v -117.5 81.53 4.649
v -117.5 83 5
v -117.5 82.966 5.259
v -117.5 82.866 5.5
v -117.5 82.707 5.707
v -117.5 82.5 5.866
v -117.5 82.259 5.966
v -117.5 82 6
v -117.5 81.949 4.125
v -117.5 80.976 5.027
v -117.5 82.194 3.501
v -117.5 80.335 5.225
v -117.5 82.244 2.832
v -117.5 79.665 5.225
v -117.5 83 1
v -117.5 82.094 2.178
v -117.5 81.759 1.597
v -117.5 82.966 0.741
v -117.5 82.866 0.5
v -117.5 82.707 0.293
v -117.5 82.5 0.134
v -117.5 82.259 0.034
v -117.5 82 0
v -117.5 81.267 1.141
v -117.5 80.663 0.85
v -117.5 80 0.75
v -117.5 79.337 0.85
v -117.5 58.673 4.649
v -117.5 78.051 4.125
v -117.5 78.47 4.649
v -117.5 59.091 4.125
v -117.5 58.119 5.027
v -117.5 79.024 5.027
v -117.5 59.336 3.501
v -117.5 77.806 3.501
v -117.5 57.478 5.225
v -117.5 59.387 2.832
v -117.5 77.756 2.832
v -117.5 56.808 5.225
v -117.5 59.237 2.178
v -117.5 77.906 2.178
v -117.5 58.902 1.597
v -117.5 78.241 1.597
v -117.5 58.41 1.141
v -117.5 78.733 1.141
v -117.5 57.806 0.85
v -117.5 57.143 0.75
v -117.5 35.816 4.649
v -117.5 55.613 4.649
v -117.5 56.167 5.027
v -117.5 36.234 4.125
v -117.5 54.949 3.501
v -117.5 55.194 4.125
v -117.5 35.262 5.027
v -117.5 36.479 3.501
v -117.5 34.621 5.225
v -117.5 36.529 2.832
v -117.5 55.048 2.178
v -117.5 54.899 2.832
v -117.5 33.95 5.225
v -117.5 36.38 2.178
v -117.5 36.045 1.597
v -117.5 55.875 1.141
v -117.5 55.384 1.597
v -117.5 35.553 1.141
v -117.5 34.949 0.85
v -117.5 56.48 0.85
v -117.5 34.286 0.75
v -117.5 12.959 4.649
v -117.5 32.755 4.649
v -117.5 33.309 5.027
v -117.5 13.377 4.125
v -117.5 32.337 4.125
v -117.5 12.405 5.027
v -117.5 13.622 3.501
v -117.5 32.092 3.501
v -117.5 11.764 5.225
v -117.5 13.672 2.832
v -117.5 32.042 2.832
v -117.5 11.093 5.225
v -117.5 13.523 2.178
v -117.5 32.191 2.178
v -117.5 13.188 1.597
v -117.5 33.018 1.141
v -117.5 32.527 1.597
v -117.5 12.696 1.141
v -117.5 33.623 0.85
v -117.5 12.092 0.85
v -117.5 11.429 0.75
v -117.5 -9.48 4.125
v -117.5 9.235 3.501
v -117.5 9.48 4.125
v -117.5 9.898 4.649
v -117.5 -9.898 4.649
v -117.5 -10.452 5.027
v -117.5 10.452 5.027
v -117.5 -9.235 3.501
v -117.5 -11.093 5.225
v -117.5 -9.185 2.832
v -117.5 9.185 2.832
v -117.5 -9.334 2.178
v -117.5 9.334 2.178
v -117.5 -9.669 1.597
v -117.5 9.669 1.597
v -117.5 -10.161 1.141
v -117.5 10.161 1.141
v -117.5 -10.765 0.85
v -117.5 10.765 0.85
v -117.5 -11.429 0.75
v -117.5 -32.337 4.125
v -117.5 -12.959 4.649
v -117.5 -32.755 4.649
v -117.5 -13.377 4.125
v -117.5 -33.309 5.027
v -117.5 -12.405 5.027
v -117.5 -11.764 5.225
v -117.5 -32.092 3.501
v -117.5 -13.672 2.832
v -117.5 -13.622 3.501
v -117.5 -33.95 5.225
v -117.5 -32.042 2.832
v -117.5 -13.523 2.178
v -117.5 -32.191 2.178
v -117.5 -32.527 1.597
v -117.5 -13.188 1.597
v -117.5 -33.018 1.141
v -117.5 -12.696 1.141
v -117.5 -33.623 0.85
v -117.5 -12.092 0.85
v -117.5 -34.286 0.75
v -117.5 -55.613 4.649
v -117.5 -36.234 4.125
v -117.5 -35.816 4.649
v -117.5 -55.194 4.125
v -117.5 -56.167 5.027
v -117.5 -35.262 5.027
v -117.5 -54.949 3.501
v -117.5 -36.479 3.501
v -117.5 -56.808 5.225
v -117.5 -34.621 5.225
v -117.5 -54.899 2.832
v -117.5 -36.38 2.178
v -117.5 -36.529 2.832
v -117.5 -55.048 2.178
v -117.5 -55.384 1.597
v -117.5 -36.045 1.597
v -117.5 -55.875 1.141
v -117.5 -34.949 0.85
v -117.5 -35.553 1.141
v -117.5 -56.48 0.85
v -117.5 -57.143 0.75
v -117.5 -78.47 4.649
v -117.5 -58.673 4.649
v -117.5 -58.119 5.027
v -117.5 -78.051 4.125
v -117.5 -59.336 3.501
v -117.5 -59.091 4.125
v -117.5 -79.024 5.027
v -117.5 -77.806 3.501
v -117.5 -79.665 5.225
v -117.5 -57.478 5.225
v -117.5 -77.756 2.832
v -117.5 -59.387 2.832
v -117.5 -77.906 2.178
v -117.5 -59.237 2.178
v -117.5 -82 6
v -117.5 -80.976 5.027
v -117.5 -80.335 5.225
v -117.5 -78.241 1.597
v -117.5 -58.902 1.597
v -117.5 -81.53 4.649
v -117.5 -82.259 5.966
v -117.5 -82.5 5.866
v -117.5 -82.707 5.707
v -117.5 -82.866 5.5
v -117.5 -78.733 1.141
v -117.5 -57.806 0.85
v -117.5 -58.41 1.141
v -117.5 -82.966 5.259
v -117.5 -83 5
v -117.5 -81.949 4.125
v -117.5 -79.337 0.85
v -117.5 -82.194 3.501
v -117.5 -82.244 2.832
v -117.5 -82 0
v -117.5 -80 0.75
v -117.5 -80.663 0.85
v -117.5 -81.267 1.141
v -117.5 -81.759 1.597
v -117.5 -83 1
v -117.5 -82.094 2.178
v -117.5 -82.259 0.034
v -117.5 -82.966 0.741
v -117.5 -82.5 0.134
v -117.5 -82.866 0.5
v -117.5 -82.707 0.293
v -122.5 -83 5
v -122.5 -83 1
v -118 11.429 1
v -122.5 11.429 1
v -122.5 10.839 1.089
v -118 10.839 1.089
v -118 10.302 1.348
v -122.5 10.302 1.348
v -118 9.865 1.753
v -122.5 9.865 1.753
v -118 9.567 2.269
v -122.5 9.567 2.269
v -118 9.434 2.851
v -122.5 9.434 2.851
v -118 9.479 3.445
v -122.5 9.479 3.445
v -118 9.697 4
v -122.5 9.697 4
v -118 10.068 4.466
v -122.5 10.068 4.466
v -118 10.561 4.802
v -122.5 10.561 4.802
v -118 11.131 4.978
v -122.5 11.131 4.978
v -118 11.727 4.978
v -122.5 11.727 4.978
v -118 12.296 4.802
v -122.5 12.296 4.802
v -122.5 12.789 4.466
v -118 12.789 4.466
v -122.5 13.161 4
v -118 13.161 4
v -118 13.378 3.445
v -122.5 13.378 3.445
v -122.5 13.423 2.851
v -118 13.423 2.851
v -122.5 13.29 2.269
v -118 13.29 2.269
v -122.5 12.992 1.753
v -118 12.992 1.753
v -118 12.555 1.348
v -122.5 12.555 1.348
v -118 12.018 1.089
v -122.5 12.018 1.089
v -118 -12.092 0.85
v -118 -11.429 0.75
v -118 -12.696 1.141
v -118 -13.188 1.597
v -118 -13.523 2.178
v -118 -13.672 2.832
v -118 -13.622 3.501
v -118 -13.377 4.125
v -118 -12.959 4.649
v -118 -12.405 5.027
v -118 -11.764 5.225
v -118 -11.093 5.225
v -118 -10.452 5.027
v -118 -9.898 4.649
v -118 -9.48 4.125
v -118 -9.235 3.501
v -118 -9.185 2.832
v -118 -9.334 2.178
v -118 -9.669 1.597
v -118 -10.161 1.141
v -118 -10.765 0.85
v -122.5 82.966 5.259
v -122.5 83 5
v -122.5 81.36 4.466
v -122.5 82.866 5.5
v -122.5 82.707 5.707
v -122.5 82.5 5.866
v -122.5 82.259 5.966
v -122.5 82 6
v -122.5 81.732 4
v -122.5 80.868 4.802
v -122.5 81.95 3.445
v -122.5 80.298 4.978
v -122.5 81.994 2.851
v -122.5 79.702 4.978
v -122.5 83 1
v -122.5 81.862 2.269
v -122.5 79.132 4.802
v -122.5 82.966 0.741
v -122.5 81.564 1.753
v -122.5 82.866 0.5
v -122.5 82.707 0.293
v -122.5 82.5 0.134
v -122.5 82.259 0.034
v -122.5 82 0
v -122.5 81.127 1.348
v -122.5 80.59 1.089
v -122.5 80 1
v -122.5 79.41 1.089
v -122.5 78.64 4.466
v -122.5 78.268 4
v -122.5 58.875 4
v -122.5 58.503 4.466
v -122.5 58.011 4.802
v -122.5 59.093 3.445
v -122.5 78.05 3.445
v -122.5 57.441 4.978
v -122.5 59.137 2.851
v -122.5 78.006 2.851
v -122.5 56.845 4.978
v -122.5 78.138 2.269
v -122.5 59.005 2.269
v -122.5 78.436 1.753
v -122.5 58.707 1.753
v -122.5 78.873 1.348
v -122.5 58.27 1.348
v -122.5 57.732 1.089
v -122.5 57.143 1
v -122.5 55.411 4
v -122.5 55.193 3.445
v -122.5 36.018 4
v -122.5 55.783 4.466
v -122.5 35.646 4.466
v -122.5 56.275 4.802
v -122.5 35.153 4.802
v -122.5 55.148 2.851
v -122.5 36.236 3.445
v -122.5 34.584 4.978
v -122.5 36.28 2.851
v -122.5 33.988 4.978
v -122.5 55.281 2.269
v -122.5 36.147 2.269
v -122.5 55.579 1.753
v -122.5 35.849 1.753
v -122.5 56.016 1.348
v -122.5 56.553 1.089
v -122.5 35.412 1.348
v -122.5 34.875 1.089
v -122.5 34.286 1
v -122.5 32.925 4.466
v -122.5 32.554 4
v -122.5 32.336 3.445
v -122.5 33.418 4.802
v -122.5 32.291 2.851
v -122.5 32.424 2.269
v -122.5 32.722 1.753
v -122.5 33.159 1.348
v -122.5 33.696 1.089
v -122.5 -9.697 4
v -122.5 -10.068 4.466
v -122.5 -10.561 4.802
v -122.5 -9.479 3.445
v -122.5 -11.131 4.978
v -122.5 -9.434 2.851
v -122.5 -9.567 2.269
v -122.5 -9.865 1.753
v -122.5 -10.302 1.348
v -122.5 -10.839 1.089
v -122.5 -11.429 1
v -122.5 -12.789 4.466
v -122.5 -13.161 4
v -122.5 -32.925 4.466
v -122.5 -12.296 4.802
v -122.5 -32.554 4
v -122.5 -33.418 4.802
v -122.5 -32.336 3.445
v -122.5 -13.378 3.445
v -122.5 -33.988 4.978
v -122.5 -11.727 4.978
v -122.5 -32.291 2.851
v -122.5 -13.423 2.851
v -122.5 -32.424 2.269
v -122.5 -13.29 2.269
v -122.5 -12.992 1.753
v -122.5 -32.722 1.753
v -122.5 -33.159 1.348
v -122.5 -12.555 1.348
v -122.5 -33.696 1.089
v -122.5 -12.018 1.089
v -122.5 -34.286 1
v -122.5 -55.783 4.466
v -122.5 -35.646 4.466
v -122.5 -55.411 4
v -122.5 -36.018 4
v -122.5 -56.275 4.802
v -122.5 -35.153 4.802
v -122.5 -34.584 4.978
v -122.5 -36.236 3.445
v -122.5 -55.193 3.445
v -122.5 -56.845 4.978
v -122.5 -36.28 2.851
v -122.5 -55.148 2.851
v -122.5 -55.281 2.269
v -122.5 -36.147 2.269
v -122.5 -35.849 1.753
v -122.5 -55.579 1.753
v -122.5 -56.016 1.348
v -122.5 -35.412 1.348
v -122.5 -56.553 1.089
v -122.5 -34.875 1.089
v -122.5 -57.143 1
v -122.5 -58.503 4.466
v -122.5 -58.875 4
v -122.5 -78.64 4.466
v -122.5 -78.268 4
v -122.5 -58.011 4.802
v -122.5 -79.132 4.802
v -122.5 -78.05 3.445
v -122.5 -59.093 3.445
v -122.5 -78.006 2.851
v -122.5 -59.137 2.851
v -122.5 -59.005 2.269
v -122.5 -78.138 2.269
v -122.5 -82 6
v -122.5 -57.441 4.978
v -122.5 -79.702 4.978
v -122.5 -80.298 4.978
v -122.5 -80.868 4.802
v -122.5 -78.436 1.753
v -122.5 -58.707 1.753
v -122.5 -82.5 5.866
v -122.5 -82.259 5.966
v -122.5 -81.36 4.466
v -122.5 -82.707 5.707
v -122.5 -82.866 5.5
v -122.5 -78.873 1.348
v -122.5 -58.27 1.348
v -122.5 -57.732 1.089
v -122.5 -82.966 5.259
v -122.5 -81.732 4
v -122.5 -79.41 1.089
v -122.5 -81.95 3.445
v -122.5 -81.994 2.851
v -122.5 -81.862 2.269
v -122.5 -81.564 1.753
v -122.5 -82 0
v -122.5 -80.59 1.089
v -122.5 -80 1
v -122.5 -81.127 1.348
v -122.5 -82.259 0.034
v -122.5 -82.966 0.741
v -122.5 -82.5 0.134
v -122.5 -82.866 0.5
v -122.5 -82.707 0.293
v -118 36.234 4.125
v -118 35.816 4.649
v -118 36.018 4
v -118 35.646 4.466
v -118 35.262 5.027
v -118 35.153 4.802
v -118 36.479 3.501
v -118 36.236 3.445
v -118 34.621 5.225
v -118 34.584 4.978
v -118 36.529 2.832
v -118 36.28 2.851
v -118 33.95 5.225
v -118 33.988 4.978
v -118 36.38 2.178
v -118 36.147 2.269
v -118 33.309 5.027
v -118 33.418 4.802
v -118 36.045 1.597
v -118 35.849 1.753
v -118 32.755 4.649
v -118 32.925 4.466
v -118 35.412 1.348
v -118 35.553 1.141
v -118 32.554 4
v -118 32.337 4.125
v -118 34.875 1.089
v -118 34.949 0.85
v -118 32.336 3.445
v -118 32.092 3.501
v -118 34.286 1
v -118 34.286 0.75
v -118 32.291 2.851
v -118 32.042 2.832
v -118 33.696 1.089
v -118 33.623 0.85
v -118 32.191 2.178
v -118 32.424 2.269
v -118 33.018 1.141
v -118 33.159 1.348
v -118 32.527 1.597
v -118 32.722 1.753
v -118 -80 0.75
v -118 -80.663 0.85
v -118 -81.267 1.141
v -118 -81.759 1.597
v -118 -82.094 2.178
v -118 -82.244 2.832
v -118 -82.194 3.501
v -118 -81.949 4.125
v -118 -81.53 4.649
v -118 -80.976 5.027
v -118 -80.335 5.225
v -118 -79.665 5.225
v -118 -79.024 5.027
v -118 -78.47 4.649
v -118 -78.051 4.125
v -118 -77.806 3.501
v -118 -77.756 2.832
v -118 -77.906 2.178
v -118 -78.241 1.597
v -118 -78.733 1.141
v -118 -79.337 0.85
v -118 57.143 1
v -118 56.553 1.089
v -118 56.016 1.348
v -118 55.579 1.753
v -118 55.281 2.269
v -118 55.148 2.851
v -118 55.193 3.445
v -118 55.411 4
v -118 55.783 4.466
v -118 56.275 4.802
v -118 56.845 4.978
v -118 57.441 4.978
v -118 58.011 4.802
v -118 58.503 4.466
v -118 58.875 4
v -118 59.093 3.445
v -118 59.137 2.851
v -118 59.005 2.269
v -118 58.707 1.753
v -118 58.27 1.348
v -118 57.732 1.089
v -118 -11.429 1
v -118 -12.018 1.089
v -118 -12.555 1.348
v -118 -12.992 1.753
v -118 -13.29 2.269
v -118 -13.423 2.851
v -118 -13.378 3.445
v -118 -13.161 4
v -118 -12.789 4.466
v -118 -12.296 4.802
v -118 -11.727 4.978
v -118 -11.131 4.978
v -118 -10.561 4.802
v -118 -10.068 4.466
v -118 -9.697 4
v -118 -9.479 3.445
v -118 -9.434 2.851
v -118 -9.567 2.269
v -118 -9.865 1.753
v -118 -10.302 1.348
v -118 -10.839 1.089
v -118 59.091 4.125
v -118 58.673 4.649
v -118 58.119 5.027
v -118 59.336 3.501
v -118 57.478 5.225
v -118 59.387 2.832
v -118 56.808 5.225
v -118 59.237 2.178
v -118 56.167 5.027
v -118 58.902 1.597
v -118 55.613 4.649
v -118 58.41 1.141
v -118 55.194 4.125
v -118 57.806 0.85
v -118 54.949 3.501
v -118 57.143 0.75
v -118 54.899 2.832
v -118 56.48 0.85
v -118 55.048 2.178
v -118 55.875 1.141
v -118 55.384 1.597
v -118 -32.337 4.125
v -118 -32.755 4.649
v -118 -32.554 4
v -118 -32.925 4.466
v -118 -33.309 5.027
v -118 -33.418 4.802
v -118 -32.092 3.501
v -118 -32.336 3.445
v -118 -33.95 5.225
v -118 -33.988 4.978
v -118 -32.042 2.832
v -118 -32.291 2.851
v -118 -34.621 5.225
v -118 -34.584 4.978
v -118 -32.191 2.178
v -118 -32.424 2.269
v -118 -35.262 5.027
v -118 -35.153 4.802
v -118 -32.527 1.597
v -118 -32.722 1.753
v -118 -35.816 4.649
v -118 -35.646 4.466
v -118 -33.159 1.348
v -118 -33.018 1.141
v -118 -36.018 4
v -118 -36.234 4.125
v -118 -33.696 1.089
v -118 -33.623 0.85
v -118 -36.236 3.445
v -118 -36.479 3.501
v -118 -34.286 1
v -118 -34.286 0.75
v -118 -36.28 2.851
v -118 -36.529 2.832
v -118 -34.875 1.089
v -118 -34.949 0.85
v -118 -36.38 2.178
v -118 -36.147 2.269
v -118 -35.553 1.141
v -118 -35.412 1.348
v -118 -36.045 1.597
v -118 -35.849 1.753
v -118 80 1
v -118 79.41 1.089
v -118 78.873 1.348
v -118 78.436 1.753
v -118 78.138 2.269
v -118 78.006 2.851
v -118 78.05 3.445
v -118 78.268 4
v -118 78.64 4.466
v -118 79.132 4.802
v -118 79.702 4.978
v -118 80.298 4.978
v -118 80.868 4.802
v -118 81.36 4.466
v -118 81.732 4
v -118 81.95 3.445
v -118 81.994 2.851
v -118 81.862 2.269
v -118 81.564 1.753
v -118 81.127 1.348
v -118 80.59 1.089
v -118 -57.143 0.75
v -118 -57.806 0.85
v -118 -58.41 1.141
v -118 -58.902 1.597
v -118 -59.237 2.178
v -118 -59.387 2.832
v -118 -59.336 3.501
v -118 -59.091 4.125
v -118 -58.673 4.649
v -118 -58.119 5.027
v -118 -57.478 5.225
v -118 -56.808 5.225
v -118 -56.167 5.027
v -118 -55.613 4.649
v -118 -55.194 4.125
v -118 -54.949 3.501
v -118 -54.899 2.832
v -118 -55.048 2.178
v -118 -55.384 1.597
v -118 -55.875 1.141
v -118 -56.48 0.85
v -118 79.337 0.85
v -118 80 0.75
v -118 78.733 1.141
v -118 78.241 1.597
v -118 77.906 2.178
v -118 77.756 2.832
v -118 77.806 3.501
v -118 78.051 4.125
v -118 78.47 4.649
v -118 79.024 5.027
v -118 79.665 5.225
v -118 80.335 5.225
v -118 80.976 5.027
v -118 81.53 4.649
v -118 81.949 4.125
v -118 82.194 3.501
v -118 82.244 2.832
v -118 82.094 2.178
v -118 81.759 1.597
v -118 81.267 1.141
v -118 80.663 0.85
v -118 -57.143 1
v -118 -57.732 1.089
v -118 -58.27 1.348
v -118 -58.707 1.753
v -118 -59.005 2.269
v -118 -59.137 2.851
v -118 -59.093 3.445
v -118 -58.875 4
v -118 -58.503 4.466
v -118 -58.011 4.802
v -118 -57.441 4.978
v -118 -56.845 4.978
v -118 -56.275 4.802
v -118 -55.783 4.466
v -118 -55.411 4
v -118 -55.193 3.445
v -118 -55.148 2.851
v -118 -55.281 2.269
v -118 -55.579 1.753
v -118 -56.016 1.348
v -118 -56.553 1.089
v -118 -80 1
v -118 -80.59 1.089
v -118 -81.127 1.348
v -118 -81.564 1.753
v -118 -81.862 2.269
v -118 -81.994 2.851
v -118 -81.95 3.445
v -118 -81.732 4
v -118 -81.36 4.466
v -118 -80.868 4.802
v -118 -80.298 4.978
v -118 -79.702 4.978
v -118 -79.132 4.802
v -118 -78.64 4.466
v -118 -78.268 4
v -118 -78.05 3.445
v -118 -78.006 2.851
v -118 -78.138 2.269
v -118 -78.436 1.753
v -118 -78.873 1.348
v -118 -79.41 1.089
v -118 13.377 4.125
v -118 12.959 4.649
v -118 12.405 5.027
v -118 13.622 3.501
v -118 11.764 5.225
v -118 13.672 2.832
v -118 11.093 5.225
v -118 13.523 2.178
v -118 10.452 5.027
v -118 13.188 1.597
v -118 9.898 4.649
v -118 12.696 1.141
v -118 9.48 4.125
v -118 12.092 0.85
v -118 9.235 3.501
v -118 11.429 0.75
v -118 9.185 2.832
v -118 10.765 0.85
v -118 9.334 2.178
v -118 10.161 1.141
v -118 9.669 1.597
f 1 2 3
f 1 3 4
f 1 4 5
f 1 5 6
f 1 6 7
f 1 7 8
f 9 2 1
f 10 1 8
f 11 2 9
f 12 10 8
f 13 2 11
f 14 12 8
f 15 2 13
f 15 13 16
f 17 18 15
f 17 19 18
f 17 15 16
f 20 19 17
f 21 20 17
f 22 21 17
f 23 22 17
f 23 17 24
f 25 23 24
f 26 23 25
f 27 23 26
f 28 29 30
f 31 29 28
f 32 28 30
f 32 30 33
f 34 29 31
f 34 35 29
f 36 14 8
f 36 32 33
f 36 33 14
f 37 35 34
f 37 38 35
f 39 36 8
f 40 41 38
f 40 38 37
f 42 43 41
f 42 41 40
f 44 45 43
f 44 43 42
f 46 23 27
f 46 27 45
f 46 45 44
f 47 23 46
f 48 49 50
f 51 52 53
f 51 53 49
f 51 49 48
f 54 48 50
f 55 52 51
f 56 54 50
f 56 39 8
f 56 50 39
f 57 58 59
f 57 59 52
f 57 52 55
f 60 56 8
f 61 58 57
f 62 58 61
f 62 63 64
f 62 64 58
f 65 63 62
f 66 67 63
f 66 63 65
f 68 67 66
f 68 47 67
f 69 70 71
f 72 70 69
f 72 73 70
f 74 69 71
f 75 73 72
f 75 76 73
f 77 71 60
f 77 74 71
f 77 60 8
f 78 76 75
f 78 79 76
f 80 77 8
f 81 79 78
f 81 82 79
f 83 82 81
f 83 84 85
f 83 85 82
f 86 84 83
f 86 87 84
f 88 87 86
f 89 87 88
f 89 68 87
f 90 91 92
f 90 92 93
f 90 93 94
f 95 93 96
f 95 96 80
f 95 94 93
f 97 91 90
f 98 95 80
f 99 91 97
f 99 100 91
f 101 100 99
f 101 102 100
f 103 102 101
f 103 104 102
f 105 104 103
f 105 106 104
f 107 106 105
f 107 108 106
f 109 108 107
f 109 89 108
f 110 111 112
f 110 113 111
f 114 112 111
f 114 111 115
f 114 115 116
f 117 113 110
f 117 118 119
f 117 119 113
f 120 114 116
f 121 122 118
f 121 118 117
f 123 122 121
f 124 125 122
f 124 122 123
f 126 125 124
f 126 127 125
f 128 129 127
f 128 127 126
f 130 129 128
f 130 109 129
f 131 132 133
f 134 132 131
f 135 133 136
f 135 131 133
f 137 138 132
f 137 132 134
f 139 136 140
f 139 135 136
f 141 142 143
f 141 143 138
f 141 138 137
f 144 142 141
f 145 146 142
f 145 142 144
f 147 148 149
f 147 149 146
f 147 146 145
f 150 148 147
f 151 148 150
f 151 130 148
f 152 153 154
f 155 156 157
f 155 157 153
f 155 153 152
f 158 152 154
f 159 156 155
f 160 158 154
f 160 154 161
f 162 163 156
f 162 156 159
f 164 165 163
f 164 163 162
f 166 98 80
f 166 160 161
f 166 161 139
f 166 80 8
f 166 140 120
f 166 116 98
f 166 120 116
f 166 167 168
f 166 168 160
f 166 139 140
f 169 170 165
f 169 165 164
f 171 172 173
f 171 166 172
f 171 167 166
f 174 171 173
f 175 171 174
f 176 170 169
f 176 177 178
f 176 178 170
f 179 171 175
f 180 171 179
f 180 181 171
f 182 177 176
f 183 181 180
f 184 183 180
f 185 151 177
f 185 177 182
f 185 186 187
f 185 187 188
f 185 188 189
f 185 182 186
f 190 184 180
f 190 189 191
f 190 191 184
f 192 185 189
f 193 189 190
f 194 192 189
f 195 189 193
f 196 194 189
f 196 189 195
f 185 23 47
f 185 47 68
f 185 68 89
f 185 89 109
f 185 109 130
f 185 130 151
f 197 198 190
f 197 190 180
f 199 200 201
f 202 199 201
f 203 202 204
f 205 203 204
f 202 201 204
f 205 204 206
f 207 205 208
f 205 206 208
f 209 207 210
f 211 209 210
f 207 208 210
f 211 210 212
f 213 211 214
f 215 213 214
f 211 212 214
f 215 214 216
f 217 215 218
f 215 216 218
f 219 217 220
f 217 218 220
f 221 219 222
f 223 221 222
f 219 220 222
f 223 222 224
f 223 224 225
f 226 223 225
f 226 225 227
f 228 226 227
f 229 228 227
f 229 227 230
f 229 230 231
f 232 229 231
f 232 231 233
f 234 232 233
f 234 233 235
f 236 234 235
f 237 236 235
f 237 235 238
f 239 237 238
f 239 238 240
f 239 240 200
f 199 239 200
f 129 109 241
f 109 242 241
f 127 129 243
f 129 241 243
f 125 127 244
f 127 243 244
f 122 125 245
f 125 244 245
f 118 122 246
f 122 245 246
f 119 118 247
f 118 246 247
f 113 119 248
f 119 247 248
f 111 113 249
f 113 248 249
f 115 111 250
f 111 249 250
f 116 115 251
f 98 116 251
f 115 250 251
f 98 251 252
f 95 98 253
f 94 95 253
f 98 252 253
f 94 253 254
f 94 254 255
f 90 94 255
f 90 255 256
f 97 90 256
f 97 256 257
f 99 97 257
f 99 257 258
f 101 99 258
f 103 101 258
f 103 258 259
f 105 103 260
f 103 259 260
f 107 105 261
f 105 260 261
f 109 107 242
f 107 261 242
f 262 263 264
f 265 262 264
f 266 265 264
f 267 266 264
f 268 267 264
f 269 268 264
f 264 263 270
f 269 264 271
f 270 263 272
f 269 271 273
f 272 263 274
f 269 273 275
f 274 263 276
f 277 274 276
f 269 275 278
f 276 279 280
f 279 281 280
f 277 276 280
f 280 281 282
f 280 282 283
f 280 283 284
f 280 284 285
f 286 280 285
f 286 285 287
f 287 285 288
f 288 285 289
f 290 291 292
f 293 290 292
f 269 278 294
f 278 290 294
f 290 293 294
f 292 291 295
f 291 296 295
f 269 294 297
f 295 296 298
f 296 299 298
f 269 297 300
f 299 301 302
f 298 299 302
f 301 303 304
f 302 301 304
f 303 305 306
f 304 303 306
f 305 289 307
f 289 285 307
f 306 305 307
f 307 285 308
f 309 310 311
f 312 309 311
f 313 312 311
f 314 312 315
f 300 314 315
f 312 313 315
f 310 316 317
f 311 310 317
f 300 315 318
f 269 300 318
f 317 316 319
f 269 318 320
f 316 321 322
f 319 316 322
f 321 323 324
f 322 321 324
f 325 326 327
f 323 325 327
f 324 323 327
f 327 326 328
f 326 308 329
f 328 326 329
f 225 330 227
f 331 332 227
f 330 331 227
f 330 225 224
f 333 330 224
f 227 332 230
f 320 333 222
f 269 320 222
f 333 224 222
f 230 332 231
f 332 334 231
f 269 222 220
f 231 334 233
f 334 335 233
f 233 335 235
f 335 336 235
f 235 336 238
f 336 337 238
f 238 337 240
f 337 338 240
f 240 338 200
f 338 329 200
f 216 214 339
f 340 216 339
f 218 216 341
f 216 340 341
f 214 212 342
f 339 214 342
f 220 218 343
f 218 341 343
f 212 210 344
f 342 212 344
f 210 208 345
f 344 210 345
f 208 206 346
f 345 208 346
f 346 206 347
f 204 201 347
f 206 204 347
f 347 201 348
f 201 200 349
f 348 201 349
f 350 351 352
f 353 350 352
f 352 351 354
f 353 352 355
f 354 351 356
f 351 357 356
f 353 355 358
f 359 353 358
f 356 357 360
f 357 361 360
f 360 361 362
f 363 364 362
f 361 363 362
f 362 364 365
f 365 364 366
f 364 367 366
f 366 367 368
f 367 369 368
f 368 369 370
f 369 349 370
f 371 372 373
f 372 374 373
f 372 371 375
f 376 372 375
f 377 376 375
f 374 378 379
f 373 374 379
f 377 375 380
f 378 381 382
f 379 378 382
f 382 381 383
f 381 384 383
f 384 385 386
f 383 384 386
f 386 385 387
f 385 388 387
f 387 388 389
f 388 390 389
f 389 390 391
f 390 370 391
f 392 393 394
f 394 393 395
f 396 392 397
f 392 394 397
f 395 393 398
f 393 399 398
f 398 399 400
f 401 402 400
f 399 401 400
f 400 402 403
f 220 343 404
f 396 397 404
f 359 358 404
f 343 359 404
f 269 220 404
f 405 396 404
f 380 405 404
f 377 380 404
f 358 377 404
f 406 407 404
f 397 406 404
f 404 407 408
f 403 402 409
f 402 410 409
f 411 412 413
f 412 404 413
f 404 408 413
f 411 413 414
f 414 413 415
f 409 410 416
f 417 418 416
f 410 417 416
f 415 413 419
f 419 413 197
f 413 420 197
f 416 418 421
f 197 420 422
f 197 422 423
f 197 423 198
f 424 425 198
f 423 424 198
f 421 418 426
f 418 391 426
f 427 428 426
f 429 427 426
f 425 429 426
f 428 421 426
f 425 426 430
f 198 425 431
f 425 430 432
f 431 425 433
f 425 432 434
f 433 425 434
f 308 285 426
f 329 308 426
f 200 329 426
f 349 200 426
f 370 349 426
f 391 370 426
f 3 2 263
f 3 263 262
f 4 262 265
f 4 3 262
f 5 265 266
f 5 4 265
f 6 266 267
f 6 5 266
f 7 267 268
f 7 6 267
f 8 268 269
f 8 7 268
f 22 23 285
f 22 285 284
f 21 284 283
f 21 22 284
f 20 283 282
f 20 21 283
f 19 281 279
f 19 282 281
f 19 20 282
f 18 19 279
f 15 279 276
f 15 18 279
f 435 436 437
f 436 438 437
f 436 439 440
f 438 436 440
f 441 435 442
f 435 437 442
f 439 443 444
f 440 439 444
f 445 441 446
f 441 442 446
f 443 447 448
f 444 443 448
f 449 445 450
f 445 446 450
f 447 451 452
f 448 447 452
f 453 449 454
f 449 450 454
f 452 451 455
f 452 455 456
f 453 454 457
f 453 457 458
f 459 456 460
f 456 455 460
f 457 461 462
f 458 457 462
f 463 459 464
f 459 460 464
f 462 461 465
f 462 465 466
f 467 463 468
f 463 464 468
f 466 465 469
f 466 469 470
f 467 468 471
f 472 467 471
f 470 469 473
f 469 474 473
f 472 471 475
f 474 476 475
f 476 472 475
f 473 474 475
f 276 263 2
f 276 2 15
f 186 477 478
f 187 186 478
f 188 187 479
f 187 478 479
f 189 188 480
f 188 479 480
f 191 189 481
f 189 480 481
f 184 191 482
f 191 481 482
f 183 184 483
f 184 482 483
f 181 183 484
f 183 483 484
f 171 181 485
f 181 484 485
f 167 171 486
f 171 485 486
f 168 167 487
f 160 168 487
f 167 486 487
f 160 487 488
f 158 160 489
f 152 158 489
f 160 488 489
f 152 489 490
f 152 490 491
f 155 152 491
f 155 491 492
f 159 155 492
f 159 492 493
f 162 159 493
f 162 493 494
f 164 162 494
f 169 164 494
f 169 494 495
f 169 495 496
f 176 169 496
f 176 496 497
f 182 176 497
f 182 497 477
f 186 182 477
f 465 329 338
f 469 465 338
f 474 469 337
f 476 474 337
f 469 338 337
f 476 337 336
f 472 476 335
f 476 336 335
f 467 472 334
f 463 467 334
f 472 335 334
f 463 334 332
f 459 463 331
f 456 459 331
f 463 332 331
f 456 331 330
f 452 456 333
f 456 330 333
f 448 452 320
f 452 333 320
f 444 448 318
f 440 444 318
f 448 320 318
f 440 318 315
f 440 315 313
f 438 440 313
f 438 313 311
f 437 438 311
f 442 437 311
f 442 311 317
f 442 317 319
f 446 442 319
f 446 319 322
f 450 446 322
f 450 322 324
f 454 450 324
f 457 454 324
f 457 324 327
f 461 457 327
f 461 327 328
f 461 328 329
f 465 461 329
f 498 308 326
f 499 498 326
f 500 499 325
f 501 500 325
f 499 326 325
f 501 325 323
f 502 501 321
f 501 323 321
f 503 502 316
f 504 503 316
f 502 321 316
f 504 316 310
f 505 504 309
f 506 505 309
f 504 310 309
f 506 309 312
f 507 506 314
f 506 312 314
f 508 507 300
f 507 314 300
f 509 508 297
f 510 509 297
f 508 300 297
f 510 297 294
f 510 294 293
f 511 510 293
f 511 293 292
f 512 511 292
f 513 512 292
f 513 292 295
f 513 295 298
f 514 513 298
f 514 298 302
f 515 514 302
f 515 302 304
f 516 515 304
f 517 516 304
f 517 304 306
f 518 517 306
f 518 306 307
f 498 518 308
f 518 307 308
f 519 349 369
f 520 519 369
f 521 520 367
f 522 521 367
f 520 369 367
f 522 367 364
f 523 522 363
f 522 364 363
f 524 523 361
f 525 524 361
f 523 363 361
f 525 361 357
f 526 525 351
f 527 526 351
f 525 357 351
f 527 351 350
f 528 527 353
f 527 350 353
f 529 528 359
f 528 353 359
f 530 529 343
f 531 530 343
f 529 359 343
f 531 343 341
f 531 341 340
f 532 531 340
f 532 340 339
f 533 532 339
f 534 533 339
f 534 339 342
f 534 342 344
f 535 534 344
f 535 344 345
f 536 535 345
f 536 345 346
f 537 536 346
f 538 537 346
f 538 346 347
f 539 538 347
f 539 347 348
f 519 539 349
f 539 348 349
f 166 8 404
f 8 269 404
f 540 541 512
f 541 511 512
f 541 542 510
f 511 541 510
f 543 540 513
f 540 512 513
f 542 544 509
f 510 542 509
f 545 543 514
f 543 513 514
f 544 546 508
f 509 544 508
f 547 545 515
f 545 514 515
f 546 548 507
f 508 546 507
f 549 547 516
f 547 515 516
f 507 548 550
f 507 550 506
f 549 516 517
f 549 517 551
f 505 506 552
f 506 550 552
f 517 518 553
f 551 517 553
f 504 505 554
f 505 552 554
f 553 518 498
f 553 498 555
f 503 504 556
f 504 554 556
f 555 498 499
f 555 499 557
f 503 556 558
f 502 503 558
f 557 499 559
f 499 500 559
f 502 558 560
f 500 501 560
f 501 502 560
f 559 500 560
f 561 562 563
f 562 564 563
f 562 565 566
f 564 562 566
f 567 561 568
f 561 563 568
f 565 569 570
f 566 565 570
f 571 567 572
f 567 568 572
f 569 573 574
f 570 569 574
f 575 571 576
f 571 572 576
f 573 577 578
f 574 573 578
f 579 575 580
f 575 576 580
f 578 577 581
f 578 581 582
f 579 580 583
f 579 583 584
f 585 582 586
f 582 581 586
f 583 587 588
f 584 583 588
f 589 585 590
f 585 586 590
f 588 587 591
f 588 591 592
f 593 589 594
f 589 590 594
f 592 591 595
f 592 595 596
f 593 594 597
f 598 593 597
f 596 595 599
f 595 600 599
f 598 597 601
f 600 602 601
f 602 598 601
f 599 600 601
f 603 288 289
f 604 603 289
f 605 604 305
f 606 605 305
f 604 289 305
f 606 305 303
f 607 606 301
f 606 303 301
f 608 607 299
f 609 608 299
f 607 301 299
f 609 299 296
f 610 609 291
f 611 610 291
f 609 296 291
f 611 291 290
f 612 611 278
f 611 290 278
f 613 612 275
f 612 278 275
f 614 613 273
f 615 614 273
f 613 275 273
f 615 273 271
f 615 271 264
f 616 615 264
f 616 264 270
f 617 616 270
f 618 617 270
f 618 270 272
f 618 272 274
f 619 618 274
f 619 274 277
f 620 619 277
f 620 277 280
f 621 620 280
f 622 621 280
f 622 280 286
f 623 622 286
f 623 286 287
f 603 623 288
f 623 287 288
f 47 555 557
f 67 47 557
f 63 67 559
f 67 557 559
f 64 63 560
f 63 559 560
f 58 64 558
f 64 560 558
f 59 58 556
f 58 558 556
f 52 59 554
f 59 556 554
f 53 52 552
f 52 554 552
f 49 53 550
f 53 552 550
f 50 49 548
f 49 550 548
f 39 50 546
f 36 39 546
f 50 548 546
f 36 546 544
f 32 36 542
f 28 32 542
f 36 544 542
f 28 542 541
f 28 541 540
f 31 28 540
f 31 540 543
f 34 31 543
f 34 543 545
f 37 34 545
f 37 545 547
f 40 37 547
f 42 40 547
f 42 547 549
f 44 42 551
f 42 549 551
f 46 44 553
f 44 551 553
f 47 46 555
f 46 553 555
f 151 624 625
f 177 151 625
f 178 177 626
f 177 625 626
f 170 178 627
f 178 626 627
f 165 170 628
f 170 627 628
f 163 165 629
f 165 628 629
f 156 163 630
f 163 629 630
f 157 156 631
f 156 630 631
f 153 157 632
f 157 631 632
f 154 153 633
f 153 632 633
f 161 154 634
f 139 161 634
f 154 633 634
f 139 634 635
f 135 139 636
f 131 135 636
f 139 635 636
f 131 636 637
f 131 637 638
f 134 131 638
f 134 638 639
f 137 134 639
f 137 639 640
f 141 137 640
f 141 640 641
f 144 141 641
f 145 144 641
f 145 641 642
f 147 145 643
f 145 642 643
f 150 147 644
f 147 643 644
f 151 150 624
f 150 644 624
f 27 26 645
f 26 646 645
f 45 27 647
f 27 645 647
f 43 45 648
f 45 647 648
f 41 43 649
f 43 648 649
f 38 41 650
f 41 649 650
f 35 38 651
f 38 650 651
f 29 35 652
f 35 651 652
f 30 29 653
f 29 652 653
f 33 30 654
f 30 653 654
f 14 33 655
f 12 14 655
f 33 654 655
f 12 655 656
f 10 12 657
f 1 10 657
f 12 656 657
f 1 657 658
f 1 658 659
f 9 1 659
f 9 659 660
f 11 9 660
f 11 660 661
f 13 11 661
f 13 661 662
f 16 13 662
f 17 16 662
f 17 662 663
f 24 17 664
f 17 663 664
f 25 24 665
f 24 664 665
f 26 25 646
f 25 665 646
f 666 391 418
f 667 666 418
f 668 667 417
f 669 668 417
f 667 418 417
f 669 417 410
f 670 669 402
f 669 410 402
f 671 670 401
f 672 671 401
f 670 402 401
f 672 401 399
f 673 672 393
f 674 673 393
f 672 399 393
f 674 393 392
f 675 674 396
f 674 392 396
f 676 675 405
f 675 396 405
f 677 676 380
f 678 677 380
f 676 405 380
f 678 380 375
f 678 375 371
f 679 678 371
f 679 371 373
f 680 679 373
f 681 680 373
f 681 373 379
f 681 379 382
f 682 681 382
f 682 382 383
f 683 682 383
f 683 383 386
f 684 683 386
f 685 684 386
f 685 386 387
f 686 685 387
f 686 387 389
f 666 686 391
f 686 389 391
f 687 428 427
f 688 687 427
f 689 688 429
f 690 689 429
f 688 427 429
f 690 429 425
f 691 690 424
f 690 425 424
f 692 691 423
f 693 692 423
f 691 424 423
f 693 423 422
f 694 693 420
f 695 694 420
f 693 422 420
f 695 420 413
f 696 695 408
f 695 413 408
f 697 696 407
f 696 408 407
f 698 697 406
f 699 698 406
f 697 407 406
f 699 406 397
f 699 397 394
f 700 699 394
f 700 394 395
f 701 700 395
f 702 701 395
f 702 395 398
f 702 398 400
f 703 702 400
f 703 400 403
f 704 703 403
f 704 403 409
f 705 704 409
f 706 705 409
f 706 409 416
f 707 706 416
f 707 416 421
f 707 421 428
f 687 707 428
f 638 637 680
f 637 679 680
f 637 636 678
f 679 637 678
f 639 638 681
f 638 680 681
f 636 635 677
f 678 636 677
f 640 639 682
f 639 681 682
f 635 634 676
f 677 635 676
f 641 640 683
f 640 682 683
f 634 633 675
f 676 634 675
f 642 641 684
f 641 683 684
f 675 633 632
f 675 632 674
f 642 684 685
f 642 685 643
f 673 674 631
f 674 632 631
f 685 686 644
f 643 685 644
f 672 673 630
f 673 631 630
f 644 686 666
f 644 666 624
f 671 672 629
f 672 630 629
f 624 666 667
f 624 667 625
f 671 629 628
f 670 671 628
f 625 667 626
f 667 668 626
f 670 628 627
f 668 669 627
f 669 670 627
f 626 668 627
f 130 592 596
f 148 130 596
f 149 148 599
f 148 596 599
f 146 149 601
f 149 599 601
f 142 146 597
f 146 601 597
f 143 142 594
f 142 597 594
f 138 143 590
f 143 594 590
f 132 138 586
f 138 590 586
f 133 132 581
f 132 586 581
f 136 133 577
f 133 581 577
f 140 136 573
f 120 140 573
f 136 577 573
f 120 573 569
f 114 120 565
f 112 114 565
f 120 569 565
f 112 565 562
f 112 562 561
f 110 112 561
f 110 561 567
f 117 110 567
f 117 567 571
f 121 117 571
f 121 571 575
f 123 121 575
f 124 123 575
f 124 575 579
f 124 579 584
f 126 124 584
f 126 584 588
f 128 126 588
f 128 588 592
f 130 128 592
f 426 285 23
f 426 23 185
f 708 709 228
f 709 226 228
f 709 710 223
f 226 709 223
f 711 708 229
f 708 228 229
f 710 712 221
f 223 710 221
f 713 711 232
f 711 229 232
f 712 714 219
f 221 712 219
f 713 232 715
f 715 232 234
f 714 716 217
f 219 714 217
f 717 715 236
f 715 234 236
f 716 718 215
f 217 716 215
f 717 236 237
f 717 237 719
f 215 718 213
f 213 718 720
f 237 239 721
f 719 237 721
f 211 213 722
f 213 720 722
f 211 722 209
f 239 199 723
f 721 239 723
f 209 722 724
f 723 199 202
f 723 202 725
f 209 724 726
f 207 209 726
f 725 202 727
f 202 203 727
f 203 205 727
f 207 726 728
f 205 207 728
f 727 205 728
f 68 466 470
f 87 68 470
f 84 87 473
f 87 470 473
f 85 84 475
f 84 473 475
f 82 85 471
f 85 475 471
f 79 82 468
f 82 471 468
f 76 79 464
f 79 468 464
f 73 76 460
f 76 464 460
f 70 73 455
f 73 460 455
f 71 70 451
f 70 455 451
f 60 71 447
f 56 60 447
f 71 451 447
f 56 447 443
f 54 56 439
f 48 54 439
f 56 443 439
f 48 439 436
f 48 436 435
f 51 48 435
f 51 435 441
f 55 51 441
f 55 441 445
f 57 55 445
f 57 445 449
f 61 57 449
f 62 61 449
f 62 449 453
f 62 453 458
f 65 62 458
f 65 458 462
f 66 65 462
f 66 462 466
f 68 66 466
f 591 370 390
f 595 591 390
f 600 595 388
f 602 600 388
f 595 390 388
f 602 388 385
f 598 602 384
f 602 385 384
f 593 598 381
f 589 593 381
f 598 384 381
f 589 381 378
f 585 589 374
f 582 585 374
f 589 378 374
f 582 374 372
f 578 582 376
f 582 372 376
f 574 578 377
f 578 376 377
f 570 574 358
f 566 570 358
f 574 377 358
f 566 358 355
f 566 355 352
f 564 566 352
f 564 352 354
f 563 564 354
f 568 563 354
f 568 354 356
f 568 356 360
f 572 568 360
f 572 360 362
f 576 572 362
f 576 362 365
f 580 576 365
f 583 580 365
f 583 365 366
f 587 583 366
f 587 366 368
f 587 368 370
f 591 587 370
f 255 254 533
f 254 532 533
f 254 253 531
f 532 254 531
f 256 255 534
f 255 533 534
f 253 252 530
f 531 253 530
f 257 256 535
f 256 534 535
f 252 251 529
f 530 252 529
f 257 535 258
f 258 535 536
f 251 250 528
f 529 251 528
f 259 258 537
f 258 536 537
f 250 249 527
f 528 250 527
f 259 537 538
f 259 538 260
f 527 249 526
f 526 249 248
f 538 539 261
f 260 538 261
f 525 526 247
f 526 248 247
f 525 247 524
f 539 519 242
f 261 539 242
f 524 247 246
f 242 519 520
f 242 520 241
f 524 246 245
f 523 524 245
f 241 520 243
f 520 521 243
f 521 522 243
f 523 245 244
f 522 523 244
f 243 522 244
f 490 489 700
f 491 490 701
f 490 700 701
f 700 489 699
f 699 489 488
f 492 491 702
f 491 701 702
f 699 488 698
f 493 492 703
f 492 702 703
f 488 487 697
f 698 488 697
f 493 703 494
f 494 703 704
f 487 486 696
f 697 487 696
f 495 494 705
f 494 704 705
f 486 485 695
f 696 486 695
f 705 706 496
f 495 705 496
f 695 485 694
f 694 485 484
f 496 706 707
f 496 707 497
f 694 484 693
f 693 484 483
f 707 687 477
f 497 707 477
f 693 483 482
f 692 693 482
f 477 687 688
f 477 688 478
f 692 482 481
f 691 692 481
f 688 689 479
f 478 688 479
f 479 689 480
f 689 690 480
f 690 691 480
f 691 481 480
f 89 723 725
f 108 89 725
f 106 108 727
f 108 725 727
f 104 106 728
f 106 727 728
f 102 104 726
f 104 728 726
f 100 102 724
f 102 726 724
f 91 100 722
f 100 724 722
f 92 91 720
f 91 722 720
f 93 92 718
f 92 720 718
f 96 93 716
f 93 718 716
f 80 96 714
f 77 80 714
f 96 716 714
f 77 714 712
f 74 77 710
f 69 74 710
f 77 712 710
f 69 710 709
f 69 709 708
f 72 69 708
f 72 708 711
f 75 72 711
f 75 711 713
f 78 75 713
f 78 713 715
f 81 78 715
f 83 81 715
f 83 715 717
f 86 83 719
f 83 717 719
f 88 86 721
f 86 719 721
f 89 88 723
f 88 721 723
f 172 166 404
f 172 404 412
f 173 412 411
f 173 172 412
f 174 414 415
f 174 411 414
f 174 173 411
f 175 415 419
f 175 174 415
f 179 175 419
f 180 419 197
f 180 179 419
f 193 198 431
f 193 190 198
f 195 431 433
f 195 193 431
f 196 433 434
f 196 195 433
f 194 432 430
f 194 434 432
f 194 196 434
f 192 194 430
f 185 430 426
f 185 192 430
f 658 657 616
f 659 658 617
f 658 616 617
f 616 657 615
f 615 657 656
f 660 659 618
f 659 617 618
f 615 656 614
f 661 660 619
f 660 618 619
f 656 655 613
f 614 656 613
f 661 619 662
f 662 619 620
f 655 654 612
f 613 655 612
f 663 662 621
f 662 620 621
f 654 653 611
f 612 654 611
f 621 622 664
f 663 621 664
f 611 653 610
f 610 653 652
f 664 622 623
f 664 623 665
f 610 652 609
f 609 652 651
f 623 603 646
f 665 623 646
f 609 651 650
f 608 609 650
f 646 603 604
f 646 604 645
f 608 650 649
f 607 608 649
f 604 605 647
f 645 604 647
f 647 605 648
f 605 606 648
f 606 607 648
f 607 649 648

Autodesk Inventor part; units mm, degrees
ref_plane "YZ Plane" through (0, 0, 0) normal (1, 0, 0) x (0, 1, 0)
ref_plane "XZ Plane" through (0, 0, 0) normal (0, 1, 0) x (-1, 0, 0)
ref_plane "XY Plane" through (0, 0, 0) normal (0, 0, 1) x (1, 0, 0)
ref_plane "Work Plane1" through (-122.5, -83, 0) normal (1, 0, 0) x (0, -1, 0)
sketch "Sketch1" plane through (-122.5, -83, 0) normal (1, 0, 0) x (0, -1, 0)
  circle A0 centre (-140.1429, -3) radius 1.8 projected
  circle A1 centre (-94.4286, -3) radius 1.8 projected
  circle A2 centre (-48.7143, -3) radius 1.8 projected
  circle A3 centre (-3, -3) radius 1.8 projected
  circle A4 centre (-25.8571, -3) radius 1.8 projected
  circle A5 centre (-71.5714, -3) radius 1.8 projected
  circle A6 centre (-117.2857, -3) radius 1.8 projected
  circle A7 centre (-163, -3) radius 1.8 projected
  line L0 (-166, -6) -> (0, -6) projected
  line L1 (0, 0) -> (0, -6) projected
  line L2 (-166, 0) -> (0, 0) projected
  line L3 (-166, -6) -> (-166, 0) projected
  point P0 (-83, 0)
extrude "Extrusion1" add sketch "Sketch1" along normal blind 5
fillet "Fillet1" radius 1 4 edges at (-120, -83, 0) (-120, -83, 6) (-120, 83, 6) (-120, 83, 0)
sketch "Sketch2" plane through (-117.5, -83, 0) normal (1, 0, 0) x (0, 0, -1)
  arc A0 (0, 165) -> (-1, 166) centre (-1, 165) ccw projected
  line L0 (-1, 166) -> (-5, 166) projected
  arc A1 (-5, 166) -> (-6, 165) centre (-5, 165) ccw projected
  line L1 (-6, 165) -> (-6, 1) projected
  arc A2 (-6, 1) -> (-5, 0) centre (-5, 1) ccw projected
  line L2 (-5, 0) -> (-1, 0) projected
  arc A3 (-1, 0) -> (0, 1) centre (-1, 1) ccw projected
  line L3 (0, 1) -> (0, 165) projected
  circle A4 centre (-3, 163) radius 1.8 projected
  circle A5 centre (-3, 117.2857) radius 1.8 projected
  circle A6 centre (-3, 71.5714) radius 1.8 projected
  circle A7 centre (-3, 25.8571) radius 1.8 projected
  circle A8 centre (-3, 3) radius 1.8 projected
  circle A9 centre (-3, 48.7143) radius 1.8 projected
  circle A10 centre (-3, 94.4286) radius 1.8 projected
  circle A11 centre (-3, 140.1429) radius 1.8 projected
  point P0 (0, 83)
hole "Hole1" at (-117.5, -80, 3) at (-117.5, -57.1429, 3) at (-117.5, -34.2857, 3) at (-117.5, -11.4286, 3) at (-117.5, 11.4286, 3) at (-117.5, 34.2857, 3) at (-117.5, 57.1429, 3) at (-117.5, 80, 3) direction (-1, 0, 0) diameter 4 end through all counterbore diameter 4.5 counterbore depth 0.5
properties part number "petg_holder"
